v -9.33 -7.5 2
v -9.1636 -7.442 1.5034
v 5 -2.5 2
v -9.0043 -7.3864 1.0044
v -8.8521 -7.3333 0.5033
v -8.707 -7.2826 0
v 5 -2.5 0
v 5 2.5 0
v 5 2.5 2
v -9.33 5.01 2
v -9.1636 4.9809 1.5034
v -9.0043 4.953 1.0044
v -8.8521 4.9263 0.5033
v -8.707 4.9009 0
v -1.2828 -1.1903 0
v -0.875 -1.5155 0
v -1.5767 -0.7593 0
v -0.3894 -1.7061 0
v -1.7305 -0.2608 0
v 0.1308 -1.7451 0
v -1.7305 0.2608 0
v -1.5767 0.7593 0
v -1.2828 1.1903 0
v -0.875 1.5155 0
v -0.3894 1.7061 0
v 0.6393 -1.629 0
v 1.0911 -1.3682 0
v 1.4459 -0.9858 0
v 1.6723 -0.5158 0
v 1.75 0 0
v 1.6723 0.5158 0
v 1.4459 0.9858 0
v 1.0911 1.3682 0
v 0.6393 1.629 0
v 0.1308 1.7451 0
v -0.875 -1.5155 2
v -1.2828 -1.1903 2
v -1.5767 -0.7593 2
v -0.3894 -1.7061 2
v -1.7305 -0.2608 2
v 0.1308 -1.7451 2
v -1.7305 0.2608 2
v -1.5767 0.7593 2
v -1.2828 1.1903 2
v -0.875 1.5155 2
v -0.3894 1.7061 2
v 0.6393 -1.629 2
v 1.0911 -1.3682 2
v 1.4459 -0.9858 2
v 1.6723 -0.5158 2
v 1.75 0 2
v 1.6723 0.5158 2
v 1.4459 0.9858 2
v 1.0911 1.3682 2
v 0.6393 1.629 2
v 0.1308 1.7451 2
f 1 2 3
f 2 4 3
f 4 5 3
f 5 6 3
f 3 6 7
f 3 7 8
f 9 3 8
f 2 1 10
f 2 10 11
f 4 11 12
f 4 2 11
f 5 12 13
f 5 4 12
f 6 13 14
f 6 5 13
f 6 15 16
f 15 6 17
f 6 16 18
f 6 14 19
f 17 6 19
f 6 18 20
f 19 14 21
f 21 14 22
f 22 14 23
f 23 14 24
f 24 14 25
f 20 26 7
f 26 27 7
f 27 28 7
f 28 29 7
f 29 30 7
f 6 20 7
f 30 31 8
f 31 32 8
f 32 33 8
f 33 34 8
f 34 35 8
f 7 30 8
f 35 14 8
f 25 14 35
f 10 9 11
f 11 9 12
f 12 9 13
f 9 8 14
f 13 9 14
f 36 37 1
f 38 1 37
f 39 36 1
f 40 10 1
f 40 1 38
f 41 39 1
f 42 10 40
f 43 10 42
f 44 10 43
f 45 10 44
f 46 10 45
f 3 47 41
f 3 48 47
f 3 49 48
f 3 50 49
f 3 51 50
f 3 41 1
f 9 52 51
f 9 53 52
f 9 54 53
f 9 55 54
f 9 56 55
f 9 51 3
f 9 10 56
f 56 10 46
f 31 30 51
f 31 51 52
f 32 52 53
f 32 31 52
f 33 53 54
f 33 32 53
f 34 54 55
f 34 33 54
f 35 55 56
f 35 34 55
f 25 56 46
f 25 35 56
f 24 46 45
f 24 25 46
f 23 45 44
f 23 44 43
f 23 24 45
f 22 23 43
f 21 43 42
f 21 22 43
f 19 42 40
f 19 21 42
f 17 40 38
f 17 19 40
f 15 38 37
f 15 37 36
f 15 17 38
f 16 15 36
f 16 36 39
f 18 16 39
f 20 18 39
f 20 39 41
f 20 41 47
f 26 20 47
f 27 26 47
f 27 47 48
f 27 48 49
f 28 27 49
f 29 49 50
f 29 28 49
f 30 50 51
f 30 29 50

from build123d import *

# Parameters (mm, degrees)
SKETCH15_R              = 1.75
BOSS_EXTRUDE2_DEPTH     = 2
CUT_EXTRUDE1_DEPTH      = 13.136675822
CUT_EXTRUDE1_DEPTH_BACK = 13.136675822
SKETCH16_R              = 37


with BuildPart() as part:
    # Sketch15 → Boss-Extrude2 (new body)
    with BuildSketch(Plane.XY):
        Polygon((-9.33, 5.01), (-9.33, -7.5), (5, -2.5), (5, 2.5), align=None)
        Circle(SKETCH15_R, mode=Mode.SUBTRACT)
    extrude(amount=BOSS_EXTRUDE2_DEPTH)

    # Sketch16 → Cut-Extrude1 (cut, two sides: drawn at the far end of the back side and taken through both)
    with BuildSketch(Plane(origin=(0, 0, 0), x_dir=(1, 0, 0), z_dir=(0, 1, 0)).offset(-CUT_EXTRUDE1_DEPTH_BACK)):
        with Locations((-44.33, 10)):
            Circle(SKETCH16_R)
    extrude(amount=CUT_EXTRUDE1_DEPTH + CUT_EXTRUDE1_DEPTH_BACK, mode=Mode.SUBTRACT)


solid = part.part
